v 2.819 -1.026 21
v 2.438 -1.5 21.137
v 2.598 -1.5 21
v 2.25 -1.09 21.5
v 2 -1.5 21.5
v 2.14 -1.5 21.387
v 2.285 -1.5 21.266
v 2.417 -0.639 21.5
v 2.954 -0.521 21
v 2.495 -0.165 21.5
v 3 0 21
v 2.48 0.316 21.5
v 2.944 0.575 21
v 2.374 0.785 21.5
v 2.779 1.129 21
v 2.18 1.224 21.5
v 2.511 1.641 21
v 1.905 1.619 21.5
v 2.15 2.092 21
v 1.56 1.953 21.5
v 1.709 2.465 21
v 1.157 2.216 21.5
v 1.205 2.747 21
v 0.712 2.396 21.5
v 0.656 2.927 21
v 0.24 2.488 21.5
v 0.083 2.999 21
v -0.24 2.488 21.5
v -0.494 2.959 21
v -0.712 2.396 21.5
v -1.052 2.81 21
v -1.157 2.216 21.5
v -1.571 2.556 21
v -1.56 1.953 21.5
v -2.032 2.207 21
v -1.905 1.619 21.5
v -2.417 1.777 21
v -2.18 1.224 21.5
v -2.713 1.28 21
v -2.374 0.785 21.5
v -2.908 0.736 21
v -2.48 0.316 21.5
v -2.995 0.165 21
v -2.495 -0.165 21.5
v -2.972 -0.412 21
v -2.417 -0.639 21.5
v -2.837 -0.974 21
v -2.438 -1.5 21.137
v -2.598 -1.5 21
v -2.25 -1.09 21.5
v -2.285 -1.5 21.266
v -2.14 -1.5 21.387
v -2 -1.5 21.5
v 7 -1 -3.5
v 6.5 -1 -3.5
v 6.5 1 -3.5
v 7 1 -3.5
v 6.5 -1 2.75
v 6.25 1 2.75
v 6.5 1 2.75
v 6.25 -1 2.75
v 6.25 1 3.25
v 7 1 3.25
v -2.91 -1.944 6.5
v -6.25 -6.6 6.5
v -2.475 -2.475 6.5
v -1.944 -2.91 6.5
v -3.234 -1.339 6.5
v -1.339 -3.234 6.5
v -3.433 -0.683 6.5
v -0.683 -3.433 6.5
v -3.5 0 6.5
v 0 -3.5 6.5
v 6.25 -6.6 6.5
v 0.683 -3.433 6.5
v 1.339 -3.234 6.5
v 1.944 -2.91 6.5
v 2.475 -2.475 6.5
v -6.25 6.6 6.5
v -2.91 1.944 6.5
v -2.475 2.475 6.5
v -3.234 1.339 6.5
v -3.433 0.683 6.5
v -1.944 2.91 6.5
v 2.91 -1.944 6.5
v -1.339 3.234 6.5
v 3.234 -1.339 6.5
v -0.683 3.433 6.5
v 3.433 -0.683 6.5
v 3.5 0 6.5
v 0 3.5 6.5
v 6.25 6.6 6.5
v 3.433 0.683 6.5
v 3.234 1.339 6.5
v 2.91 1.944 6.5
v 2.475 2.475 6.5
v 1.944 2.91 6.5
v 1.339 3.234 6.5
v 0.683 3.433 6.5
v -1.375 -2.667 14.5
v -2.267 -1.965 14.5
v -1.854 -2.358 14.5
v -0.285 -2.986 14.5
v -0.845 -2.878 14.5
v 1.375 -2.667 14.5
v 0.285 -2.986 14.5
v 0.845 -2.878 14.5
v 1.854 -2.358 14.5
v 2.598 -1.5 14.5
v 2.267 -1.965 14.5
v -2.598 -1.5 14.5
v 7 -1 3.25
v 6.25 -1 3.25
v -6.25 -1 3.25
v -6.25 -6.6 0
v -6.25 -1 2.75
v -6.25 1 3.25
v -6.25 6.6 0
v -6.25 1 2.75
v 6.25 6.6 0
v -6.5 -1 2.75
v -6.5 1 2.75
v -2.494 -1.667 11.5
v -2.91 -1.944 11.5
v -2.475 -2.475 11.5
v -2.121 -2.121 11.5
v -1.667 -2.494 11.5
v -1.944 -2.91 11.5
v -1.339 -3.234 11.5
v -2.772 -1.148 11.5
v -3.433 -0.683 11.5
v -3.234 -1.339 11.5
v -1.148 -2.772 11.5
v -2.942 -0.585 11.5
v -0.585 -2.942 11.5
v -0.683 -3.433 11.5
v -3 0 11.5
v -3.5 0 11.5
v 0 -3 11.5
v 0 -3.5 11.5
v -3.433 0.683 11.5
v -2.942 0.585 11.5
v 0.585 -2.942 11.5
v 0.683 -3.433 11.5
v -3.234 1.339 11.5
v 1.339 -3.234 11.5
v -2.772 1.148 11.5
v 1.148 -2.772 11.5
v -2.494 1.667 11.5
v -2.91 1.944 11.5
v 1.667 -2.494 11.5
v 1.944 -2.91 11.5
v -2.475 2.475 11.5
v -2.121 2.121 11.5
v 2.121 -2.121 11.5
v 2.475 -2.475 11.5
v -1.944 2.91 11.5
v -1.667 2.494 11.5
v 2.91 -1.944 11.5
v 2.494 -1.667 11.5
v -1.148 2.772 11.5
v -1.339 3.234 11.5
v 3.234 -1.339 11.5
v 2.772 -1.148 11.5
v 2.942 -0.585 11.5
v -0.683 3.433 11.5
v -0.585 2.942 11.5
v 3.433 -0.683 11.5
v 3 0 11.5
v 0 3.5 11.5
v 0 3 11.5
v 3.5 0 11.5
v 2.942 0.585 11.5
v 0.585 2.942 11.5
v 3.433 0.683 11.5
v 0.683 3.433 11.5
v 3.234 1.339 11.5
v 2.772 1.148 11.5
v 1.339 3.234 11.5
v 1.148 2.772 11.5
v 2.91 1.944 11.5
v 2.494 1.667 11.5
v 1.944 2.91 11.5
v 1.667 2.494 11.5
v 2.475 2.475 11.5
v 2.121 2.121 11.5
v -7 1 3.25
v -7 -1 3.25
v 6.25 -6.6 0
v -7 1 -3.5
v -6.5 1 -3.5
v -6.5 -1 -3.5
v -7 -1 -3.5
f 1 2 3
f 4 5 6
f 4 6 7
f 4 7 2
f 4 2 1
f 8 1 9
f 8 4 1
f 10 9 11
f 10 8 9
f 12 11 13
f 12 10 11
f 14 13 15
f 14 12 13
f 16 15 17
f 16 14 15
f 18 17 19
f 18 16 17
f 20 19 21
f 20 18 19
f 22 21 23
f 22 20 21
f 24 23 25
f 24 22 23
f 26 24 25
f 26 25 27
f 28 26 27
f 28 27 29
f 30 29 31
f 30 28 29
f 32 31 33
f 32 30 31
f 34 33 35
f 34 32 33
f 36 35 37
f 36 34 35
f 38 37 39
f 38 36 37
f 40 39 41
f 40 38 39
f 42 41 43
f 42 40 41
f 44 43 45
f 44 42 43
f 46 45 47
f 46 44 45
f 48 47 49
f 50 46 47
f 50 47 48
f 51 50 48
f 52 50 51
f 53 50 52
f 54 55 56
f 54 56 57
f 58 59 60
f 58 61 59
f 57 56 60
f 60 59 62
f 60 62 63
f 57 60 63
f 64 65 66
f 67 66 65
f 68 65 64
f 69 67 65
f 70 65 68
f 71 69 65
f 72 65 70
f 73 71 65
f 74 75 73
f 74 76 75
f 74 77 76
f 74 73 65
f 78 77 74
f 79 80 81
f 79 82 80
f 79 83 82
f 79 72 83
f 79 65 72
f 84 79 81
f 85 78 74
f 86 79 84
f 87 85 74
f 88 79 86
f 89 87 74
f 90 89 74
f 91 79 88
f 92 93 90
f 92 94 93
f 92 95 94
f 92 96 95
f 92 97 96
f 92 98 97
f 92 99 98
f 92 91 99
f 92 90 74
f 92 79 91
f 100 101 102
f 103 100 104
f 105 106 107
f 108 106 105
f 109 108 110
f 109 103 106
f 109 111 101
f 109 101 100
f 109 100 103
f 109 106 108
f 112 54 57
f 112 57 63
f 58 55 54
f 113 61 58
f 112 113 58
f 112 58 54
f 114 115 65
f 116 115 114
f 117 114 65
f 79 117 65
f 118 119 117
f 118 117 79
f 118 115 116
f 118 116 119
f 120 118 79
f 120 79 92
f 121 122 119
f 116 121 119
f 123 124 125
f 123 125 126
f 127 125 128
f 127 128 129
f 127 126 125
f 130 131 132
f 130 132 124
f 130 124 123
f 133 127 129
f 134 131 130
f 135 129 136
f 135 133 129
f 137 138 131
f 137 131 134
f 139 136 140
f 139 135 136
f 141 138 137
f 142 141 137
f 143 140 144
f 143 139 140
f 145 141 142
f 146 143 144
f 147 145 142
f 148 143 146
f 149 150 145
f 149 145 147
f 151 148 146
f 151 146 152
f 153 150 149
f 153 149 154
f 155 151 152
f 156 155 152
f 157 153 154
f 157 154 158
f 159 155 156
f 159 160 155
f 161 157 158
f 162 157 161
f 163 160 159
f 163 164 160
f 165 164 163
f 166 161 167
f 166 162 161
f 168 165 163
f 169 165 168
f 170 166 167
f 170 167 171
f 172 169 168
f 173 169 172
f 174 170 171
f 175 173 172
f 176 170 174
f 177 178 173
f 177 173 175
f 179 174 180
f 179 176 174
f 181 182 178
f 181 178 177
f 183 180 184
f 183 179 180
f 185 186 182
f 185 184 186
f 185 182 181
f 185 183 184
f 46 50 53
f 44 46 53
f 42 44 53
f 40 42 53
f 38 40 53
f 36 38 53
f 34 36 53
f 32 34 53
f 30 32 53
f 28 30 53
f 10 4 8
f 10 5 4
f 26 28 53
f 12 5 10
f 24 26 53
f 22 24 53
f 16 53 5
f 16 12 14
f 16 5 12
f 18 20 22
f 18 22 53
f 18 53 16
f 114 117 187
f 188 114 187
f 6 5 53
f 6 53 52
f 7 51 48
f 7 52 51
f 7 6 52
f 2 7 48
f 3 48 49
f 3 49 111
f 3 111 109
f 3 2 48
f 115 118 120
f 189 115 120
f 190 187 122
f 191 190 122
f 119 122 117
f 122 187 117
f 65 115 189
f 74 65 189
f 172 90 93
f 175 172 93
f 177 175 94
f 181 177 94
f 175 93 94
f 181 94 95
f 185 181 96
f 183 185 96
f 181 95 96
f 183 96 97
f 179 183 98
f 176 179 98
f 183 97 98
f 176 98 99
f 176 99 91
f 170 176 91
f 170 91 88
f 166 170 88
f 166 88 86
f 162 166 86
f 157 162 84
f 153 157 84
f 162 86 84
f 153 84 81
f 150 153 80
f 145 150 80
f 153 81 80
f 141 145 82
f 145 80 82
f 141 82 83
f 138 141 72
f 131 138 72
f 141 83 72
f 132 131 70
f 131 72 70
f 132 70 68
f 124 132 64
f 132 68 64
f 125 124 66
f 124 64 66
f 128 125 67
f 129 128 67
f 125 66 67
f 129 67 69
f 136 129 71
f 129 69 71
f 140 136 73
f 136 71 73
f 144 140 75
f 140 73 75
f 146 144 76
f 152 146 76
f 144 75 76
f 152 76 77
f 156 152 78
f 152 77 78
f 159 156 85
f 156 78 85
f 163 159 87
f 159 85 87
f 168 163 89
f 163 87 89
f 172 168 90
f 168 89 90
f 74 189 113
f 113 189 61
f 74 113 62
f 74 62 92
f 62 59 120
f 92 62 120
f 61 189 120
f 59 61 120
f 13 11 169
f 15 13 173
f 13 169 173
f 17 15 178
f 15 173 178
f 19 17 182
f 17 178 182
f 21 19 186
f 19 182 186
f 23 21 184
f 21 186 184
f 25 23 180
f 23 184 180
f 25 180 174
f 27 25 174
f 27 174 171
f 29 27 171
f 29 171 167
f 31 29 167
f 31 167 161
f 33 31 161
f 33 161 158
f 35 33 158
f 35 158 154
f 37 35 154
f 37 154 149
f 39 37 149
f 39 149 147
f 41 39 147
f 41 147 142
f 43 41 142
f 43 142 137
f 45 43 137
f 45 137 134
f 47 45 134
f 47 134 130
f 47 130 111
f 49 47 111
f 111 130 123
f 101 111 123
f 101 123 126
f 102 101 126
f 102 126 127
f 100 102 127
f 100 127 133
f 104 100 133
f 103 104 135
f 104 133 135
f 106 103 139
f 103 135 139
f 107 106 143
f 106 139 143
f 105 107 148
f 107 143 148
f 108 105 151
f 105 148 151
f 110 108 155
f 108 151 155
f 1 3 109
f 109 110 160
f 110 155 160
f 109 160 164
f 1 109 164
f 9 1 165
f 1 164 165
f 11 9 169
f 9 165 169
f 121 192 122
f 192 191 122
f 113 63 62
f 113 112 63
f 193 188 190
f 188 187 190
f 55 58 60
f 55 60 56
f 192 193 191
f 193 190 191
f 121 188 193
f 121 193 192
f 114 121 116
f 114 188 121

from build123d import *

# Parameters (mm, degrees)
F0_W      = 12.5
F0_H      = 13.2
F1_DEPTH  = 6.5
F2_R      = 3.5
F3_DEPTH  = 5
F4_R      = 3
F5_DEPTH  = 10
F6_SIZE   = 0.5
F7_W      = 12.7
F7_H      = 1.5
F8_DEPTH  = 7
F10_DEPTH = 1


with BuildPart() as f1:
    # F0 (on Top) → F1 (new body)
    with BuildSketch(Plane.XY):
        Rectangle(F0_W, F0_H)
    extrude(amount=F1_DEPTH)

    # F2 (on face) → F3 (join)
    with BuildSketch(Plane.XY.offset(6.5)):
        Circle(F2_R)
    extrude(amount=F3_DEPTH)

    # F4 (on face) → F5 (join)
    with BuildSketch(Plane.XY.offset(11.5)):
        Circle(F4_R)
    extrude(amount=F5_DEPTH)

    # F6
    f6_edges = [f1.edges().sort_by_distance(p)[0] for p in [
        (-3, 0, 21.5),
    ]]
    chamfer(f6_edges, length=F6_SIZE)

    # F7 (on face) → F8 (cut)
    with BuildSketch(Plane.XY.offset(21.5)):
        with Locations((0, -2.25)):
            Rectangle(F7_W, F7_H)
    extrude(amount=-F8_DEPTH, mode=Mode.SUBTRACT)

    # F9 (on Front) → F10 (join, symmetric)
    with BuildSketch(Plane.XZ):
        Polygon((-6.25, 3.25), (-7, 3.25), (-7, -3.5), (-6.5, -3.5), (-6.5, 2.75), (-6.25, 2.75), align=None)
        Polygon((6.25, 2.75), (6.5, 2.75), (6.5, -3.5), (7, -3.5), (7, 3.25), (6.25, 3.25), align=None)
    extrude(amount=F10_DEPTH, both=True)


solid = f1.part
